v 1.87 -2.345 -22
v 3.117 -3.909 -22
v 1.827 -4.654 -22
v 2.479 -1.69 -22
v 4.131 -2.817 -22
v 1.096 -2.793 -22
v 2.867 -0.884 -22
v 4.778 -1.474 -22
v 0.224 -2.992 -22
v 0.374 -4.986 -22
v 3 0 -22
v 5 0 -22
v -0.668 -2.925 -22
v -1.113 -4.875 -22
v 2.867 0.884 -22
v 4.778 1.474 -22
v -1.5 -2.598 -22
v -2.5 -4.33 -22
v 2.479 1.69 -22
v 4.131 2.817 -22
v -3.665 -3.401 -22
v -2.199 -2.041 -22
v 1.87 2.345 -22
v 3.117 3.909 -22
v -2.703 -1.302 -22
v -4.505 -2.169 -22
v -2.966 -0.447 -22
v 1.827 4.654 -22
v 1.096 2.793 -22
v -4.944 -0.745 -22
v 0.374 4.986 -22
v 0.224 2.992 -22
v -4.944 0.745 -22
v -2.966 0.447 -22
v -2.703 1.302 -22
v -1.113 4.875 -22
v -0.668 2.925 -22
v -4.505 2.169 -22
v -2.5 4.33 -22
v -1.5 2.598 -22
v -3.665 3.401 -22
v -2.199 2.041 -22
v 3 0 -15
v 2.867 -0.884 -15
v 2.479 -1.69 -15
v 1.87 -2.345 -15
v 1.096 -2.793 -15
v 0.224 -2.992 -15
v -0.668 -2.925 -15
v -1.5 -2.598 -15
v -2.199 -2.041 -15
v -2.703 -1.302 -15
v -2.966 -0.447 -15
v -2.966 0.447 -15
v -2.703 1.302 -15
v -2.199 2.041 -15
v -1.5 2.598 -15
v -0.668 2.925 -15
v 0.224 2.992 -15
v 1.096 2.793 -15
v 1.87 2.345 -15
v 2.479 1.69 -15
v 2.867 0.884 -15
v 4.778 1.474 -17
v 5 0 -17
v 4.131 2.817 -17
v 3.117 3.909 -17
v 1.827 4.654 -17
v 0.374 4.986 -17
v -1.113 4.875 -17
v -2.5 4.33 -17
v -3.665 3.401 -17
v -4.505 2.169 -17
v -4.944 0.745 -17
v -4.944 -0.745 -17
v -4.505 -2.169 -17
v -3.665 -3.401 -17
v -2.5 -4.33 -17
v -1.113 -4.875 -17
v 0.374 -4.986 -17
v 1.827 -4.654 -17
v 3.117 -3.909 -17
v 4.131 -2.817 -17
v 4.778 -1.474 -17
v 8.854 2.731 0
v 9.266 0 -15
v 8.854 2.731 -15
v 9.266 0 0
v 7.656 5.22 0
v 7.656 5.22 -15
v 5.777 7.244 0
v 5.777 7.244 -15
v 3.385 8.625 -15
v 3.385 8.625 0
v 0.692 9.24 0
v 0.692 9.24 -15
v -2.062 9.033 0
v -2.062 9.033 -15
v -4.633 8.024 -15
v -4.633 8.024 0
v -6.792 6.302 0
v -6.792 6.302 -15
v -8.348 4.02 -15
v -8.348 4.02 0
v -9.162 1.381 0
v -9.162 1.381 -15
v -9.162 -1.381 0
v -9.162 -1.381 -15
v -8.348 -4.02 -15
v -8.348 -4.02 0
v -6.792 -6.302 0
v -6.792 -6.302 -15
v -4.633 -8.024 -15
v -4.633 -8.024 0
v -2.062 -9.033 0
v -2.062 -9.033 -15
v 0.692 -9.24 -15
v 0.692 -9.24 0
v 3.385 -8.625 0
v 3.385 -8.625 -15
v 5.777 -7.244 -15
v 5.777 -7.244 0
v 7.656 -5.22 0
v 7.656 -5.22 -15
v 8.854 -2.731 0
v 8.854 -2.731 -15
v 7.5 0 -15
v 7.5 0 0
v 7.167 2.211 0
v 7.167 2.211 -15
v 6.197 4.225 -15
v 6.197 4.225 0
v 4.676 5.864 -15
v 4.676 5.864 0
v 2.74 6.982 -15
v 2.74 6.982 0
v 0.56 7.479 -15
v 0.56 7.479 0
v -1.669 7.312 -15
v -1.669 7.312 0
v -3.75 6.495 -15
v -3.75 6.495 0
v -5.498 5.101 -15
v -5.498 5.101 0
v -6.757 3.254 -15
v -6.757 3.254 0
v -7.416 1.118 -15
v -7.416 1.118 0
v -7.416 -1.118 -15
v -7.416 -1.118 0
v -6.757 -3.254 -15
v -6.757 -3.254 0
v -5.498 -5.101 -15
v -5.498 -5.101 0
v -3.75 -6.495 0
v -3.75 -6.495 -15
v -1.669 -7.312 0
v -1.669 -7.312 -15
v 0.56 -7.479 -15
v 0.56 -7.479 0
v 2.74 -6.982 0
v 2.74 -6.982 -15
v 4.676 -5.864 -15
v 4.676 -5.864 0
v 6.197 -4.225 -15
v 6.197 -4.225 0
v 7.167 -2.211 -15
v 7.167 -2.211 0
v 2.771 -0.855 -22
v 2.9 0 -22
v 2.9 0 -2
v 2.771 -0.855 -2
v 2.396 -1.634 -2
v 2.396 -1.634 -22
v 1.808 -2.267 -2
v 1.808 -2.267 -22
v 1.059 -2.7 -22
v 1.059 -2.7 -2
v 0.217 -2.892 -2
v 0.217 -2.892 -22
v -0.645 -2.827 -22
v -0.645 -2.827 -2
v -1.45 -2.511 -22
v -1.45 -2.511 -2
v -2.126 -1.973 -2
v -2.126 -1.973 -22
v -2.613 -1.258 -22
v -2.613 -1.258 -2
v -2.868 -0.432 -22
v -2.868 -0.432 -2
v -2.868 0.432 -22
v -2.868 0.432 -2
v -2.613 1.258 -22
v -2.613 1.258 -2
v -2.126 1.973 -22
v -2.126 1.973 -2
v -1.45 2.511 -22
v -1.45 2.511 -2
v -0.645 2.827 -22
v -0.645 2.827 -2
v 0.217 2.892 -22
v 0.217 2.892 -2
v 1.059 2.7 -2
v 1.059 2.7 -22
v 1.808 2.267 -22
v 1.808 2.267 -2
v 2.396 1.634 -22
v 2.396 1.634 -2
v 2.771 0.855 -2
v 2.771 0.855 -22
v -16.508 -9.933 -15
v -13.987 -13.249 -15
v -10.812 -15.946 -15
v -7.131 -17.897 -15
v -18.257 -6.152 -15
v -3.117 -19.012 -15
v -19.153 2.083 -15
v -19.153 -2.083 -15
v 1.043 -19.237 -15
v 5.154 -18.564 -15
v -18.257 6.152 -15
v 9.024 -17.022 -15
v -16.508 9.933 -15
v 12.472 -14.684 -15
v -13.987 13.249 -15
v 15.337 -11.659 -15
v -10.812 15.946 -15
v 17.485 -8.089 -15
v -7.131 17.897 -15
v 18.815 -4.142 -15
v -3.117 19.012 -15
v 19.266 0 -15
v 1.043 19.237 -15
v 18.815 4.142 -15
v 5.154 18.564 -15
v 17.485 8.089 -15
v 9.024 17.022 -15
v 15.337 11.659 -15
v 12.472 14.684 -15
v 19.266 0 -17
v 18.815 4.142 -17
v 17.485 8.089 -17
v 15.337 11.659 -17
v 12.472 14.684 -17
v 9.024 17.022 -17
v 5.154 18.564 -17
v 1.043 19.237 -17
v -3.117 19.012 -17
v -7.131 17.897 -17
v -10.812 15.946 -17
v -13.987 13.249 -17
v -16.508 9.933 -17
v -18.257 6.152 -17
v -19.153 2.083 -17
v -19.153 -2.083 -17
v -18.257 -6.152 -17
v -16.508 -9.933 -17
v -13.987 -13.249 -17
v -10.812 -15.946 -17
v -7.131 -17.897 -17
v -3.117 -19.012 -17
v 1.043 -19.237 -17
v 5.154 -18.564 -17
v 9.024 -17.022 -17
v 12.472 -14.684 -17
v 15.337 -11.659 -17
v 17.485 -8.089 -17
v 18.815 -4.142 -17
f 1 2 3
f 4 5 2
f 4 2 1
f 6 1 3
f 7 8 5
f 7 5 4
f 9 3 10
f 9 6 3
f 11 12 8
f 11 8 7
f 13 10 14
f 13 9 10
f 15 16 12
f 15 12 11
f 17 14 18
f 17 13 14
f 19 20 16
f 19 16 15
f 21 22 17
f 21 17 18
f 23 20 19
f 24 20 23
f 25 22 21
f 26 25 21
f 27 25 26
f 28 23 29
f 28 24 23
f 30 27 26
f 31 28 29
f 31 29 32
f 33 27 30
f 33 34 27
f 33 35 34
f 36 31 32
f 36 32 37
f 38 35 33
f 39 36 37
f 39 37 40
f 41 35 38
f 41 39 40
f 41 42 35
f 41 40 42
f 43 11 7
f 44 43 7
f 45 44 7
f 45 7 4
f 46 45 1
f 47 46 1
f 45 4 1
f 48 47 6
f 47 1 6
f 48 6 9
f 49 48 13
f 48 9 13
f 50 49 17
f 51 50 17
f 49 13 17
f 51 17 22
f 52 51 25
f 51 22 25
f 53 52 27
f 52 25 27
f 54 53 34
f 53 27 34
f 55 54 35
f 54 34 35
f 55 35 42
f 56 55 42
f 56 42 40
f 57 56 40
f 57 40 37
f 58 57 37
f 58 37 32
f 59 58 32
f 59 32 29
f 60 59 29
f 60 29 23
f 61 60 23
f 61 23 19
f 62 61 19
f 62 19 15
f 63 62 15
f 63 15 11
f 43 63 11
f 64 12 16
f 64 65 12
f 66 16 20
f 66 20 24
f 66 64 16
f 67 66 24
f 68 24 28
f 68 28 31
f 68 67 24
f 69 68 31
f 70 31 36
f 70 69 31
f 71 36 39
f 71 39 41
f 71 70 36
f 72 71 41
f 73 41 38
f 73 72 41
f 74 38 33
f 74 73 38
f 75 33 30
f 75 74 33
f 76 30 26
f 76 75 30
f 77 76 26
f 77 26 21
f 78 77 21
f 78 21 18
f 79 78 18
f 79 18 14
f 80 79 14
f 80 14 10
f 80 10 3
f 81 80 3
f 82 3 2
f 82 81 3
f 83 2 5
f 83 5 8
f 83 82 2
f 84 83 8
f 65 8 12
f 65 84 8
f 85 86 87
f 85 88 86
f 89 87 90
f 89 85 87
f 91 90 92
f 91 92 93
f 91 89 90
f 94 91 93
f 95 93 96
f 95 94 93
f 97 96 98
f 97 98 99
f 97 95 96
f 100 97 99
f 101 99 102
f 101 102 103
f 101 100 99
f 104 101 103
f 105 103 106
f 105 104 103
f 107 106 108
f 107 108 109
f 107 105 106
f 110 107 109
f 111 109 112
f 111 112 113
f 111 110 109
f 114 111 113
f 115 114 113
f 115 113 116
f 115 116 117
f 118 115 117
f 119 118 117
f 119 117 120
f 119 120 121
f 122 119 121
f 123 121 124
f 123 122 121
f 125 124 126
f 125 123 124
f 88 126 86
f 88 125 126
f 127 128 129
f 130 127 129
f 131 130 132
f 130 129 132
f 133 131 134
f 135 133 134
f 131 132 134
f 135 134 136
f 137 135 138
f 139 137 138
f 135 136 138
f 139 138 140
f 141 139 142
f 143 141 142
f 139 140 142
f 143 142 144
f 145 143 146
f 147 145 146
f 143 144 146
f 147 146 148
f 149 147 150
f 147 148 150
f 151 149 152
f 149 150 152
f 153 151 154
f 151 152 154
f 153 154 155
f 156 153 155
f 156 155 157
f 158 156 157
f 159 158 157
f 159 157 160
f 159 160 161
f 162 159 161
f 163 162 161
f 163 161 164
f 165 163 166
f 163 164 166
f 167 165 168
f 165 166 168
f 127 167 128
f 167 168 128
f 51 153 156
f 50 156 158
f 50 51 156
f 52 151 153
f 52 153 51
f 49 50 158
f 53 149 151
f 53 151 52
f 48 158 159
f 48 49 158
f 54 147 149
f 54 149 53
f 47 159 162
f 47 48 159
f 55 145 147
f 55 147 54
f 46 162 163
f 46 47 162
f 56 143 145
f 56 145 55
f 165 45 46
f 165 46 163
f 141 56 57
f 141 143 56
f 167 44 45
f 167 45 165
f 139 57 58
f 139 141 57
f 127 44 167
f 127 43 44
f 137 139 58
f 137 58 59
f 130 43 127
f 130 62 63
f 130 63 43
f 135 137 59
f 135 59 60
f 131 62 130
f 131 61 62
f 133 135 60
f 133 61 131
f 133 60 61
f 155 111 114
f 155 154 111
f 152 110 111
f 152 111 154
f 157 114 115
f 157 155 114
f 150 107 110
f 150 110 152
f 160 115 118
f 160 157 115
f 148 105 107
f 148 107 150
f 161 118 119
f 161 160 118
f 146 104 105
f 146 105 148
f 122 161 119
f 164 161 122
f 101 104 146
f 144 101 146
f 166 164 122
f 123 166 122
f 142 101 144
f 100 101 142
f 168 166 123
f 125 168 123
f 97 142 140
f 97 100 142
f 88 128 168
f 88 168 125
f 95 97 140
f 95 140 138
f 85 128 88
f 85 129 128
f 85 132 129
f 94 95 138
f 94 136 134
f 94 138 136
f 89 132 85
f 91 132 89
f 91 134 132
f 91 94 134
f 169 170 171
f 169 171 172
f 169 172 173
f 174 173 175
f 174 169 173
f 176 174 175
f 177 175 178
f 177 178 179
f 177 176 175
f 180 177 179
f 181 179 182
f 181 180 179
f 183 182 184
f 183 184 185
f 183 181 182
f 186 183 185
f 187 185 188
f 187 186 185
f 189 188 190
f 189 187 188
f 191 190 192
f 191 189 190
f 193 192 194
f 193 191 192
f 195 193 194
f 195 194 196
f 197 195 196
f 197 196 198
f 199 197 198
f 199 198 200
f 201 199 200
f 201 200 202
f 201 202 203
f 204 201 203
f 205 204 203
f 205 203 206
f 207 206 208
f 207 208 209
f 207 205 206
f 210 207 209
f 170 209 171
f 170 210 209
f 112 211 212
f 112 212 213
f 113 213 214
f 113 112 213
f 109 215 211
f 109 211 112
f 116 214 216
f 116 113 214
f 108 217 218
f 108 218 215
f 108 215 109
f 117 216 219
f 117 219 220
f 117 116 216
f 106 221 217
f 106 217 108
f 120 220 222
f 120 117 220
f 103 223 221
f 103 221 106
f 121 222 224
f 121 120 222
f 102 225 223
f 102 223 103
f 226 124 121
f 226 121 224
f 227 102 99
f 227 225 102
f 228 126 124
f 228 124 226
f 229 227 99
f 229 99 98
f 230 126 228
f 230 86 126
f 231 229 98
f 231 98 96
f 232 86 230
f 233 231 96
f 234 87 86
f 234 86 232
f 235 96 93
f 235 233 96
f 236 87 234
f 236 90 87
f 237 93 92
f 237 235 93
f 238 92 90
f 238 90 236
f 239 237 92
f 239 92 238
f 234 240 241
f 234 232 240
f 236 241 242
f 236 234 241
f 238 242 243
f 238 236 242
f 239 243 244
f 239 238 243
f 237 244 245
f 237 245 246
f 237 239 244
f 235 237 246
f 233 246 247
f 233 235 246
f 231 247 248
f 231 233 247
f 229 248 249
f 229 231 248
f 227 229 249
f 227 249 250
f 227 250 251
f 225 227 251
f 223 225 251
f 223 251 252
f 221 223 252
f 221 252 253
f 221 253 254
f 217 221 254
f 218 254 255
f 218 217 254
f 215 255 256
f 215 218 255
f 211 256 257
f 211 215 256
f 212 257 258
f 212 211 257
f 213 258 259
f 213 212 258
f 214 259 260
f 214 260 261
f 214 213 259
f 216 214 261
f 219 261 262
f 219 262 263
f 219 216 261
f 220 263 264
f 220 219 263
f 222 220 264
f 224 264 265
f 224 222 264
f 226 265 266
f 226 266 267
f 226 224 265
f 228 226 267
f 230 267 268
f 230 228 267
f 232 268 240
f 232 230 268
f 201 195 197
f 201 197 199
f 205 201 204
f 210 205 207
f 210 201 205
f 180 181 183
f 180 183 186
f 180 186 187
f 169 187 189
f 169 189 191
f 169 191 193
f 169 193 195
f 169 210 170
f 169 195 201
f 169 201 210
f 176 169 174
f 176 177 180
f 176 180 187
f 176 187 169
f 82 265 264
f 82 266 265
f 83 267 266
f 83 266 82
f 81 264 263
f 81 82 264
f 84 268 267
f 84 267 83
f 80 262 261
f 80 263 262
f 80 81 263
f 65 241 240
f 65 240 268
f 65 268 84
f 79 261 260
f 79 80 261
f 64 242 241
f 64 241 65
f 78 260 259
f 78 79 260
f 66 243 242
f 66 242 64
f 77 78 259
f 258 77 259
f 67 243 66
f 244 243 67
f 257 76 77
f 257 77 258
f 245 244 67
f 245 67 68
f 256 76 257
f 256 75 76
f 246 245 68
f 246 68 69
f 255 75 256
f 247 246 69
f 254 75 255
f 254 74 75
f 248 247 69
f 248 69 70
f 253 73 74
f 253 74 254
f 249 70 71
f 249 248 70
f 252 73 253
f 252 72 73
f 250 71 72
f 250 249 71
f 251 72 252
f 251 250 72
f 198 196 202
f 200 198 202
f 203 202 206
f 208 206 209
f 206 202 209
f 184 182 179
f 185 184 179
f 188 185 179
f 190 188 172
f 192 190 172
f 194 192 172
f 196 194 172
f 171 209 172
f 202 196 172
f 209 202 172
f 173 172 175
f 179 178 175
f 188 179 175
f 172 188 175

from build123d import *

# Parameters (mm, degrees)
F2_R     = 7.5
F3_DEPTH = 15
F4_R     = 3
F5_DEPTH = 22.001
F6_R     = 2.9
F7_DEPTH = 20


with BuildPart() as f1:
    # F0 (on Front) → F1 (revolve)
    with BuildSketch(Plane.XZ):
        Polygon((9.265741, 0), (0, 0), (0, -22), (5, -22), (5, -17), (9.265741, -17), (19.265741, -17), (19.265741, -15), (9.265741, -15), align=None)
    revolve(axis=Axis((0, 0, -11), (0, 0, 1)))

    # F2 (on face) → F3 (cut, through all)
    with BuildSketch(Plane.XY):
        Circle(F2_R)
    extrude(amount=-F3_DEPTH, mode=Mode.SUBTRACT)

    # F4 (on face) → F5 (cut, through all)
    with BuildSketch(Plane(origin=(0, 0, -22), x_dir=(1, 0, 0), z_dir=(0, 0, -1))):
        Circle(F4_R)
    extrude(amount=-F5_DEPTH, mode=Mode.SUBTRACT)


with BuildPart() as f7:
    # F6 (on face) → F7 (new body)
    with BuildSketch(Plane(origin=(0, 0, -22), x_dir=(1, 0, 0), z_dir=(0, 0, -1))):
        Circle(F6_R)
    extrude(amount=-F7_DEPTH)


solid = Compound([f1.part, f7.part])
